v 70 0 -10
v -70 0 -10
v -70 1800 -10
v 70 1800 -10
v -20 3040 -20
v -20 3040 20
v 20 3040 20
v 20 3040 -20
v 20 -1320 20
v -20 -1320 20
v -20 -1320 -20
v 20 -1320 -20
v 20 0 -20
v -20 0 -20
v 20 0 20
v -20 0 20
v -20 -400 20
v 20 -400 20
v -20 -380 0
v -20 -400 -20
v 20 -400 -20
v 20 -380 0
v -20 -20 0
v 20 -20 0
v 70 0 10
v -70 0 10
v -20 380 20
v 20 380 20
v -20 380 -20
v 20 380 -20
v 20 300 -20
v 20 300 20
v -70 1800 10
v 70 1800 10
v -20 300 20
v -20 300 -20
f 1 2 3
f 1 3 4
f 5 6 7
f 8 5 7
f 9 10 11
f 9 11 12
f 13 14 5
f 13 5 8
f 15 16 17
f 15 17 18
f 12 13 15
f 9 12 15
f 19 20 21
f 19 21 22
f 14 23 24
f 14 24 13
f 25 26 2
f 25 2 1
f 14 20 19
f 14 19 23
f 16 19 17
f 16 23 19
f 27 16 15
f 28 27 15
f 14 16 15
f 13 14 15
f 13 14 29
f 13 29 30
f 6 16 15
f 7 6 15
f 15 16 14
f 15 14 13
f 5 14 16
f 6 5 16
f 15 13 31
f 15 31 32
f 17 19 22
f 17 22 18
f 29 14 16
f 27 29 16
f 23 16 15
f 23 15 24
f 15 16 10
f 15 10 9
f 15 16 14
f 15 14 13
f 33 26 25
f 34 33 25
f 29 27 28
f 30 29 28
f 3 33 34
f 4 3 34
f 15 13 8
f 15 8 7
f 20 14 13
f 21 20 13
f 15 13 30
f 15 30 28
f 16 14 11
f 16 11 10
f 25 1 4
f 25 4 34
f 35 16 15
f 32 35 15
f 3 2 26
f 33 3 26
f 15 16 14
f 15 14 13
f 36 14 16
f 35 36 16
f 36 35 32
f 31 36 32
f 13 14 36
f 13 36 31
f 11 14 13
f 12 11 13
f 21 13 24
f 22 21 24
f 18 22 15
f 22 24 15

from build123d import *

# Parameters (mm, degrees)
F0_W     = 140
F0_H     = 20
F1_DEPTH = 1800
F2_W     = 40
F2_H     = 40
F3_DEPTH = 380
F4_DEPTH = 400
F6_DEPTH = 84
F7_DEPTH = 300
F8_DEPTH = 1320
F9_DEPTH = 3040


with BuildPart() as f1:
    # F0 (on Front) → F1 (new body)
    with BuildSketch(Plane.XZ):
        Rectangle(F0_W, F0_H)
    extrude(amount=-F1_DEPTH)


with BuildPart() as f3:
    # F2 (on Front) → F3 (new body)
    with BuildSketch(Plane.XZ):
        Rectangle(F2_W, F2_H)
    extrude(amount=-F3_DEPTH)


with BuildPart() as f4:
    # F2 (on Front) → F4 (new body)
    with BuildSketch(Plane.XZ):
        Rectangle(F2_W, F2_H)
    extrude(amount=F4_DEPTH)

    # F5 (on face) → F6 (cut)
    with BuildSketch(Plane.YZ.offset(20)):
        Polygon((0, -20), (0, 20), (-20, 0), align=None)
        Polygon((-380, 0), (-400, 20), (-400, -20), align=None)
    extrude(amount=-F6_DEPTH, mode=Mode.SUBTRACT)


with BuildPart() as f7:
    # F2 (on Front) → F7 (new body)
    with BuildSketch(Plane.XZ):
        Rectangle(F2_W, F2_H)
    extrude(amount=-F7_DEPTH)


with BuildPart() as f8:
    # F2 (on Front) → F8 (new body)
    with BuildSketch(Plane.XZ):
        Rectangle(F2_W, F2_H)
    extrude(amount=F8_DEPTH)


with BuildPart() as f9:
    # F2 (on Front) → F9 (new body)
    with BuildSketch(Plane.XZ):
        Rectangle(F2_W, F2_H)
    extrude(amount=-F9_DEPTH)


solid = Compound([f1.part, f3.part, f4.part, f7.part, f8.part, f9.part])
